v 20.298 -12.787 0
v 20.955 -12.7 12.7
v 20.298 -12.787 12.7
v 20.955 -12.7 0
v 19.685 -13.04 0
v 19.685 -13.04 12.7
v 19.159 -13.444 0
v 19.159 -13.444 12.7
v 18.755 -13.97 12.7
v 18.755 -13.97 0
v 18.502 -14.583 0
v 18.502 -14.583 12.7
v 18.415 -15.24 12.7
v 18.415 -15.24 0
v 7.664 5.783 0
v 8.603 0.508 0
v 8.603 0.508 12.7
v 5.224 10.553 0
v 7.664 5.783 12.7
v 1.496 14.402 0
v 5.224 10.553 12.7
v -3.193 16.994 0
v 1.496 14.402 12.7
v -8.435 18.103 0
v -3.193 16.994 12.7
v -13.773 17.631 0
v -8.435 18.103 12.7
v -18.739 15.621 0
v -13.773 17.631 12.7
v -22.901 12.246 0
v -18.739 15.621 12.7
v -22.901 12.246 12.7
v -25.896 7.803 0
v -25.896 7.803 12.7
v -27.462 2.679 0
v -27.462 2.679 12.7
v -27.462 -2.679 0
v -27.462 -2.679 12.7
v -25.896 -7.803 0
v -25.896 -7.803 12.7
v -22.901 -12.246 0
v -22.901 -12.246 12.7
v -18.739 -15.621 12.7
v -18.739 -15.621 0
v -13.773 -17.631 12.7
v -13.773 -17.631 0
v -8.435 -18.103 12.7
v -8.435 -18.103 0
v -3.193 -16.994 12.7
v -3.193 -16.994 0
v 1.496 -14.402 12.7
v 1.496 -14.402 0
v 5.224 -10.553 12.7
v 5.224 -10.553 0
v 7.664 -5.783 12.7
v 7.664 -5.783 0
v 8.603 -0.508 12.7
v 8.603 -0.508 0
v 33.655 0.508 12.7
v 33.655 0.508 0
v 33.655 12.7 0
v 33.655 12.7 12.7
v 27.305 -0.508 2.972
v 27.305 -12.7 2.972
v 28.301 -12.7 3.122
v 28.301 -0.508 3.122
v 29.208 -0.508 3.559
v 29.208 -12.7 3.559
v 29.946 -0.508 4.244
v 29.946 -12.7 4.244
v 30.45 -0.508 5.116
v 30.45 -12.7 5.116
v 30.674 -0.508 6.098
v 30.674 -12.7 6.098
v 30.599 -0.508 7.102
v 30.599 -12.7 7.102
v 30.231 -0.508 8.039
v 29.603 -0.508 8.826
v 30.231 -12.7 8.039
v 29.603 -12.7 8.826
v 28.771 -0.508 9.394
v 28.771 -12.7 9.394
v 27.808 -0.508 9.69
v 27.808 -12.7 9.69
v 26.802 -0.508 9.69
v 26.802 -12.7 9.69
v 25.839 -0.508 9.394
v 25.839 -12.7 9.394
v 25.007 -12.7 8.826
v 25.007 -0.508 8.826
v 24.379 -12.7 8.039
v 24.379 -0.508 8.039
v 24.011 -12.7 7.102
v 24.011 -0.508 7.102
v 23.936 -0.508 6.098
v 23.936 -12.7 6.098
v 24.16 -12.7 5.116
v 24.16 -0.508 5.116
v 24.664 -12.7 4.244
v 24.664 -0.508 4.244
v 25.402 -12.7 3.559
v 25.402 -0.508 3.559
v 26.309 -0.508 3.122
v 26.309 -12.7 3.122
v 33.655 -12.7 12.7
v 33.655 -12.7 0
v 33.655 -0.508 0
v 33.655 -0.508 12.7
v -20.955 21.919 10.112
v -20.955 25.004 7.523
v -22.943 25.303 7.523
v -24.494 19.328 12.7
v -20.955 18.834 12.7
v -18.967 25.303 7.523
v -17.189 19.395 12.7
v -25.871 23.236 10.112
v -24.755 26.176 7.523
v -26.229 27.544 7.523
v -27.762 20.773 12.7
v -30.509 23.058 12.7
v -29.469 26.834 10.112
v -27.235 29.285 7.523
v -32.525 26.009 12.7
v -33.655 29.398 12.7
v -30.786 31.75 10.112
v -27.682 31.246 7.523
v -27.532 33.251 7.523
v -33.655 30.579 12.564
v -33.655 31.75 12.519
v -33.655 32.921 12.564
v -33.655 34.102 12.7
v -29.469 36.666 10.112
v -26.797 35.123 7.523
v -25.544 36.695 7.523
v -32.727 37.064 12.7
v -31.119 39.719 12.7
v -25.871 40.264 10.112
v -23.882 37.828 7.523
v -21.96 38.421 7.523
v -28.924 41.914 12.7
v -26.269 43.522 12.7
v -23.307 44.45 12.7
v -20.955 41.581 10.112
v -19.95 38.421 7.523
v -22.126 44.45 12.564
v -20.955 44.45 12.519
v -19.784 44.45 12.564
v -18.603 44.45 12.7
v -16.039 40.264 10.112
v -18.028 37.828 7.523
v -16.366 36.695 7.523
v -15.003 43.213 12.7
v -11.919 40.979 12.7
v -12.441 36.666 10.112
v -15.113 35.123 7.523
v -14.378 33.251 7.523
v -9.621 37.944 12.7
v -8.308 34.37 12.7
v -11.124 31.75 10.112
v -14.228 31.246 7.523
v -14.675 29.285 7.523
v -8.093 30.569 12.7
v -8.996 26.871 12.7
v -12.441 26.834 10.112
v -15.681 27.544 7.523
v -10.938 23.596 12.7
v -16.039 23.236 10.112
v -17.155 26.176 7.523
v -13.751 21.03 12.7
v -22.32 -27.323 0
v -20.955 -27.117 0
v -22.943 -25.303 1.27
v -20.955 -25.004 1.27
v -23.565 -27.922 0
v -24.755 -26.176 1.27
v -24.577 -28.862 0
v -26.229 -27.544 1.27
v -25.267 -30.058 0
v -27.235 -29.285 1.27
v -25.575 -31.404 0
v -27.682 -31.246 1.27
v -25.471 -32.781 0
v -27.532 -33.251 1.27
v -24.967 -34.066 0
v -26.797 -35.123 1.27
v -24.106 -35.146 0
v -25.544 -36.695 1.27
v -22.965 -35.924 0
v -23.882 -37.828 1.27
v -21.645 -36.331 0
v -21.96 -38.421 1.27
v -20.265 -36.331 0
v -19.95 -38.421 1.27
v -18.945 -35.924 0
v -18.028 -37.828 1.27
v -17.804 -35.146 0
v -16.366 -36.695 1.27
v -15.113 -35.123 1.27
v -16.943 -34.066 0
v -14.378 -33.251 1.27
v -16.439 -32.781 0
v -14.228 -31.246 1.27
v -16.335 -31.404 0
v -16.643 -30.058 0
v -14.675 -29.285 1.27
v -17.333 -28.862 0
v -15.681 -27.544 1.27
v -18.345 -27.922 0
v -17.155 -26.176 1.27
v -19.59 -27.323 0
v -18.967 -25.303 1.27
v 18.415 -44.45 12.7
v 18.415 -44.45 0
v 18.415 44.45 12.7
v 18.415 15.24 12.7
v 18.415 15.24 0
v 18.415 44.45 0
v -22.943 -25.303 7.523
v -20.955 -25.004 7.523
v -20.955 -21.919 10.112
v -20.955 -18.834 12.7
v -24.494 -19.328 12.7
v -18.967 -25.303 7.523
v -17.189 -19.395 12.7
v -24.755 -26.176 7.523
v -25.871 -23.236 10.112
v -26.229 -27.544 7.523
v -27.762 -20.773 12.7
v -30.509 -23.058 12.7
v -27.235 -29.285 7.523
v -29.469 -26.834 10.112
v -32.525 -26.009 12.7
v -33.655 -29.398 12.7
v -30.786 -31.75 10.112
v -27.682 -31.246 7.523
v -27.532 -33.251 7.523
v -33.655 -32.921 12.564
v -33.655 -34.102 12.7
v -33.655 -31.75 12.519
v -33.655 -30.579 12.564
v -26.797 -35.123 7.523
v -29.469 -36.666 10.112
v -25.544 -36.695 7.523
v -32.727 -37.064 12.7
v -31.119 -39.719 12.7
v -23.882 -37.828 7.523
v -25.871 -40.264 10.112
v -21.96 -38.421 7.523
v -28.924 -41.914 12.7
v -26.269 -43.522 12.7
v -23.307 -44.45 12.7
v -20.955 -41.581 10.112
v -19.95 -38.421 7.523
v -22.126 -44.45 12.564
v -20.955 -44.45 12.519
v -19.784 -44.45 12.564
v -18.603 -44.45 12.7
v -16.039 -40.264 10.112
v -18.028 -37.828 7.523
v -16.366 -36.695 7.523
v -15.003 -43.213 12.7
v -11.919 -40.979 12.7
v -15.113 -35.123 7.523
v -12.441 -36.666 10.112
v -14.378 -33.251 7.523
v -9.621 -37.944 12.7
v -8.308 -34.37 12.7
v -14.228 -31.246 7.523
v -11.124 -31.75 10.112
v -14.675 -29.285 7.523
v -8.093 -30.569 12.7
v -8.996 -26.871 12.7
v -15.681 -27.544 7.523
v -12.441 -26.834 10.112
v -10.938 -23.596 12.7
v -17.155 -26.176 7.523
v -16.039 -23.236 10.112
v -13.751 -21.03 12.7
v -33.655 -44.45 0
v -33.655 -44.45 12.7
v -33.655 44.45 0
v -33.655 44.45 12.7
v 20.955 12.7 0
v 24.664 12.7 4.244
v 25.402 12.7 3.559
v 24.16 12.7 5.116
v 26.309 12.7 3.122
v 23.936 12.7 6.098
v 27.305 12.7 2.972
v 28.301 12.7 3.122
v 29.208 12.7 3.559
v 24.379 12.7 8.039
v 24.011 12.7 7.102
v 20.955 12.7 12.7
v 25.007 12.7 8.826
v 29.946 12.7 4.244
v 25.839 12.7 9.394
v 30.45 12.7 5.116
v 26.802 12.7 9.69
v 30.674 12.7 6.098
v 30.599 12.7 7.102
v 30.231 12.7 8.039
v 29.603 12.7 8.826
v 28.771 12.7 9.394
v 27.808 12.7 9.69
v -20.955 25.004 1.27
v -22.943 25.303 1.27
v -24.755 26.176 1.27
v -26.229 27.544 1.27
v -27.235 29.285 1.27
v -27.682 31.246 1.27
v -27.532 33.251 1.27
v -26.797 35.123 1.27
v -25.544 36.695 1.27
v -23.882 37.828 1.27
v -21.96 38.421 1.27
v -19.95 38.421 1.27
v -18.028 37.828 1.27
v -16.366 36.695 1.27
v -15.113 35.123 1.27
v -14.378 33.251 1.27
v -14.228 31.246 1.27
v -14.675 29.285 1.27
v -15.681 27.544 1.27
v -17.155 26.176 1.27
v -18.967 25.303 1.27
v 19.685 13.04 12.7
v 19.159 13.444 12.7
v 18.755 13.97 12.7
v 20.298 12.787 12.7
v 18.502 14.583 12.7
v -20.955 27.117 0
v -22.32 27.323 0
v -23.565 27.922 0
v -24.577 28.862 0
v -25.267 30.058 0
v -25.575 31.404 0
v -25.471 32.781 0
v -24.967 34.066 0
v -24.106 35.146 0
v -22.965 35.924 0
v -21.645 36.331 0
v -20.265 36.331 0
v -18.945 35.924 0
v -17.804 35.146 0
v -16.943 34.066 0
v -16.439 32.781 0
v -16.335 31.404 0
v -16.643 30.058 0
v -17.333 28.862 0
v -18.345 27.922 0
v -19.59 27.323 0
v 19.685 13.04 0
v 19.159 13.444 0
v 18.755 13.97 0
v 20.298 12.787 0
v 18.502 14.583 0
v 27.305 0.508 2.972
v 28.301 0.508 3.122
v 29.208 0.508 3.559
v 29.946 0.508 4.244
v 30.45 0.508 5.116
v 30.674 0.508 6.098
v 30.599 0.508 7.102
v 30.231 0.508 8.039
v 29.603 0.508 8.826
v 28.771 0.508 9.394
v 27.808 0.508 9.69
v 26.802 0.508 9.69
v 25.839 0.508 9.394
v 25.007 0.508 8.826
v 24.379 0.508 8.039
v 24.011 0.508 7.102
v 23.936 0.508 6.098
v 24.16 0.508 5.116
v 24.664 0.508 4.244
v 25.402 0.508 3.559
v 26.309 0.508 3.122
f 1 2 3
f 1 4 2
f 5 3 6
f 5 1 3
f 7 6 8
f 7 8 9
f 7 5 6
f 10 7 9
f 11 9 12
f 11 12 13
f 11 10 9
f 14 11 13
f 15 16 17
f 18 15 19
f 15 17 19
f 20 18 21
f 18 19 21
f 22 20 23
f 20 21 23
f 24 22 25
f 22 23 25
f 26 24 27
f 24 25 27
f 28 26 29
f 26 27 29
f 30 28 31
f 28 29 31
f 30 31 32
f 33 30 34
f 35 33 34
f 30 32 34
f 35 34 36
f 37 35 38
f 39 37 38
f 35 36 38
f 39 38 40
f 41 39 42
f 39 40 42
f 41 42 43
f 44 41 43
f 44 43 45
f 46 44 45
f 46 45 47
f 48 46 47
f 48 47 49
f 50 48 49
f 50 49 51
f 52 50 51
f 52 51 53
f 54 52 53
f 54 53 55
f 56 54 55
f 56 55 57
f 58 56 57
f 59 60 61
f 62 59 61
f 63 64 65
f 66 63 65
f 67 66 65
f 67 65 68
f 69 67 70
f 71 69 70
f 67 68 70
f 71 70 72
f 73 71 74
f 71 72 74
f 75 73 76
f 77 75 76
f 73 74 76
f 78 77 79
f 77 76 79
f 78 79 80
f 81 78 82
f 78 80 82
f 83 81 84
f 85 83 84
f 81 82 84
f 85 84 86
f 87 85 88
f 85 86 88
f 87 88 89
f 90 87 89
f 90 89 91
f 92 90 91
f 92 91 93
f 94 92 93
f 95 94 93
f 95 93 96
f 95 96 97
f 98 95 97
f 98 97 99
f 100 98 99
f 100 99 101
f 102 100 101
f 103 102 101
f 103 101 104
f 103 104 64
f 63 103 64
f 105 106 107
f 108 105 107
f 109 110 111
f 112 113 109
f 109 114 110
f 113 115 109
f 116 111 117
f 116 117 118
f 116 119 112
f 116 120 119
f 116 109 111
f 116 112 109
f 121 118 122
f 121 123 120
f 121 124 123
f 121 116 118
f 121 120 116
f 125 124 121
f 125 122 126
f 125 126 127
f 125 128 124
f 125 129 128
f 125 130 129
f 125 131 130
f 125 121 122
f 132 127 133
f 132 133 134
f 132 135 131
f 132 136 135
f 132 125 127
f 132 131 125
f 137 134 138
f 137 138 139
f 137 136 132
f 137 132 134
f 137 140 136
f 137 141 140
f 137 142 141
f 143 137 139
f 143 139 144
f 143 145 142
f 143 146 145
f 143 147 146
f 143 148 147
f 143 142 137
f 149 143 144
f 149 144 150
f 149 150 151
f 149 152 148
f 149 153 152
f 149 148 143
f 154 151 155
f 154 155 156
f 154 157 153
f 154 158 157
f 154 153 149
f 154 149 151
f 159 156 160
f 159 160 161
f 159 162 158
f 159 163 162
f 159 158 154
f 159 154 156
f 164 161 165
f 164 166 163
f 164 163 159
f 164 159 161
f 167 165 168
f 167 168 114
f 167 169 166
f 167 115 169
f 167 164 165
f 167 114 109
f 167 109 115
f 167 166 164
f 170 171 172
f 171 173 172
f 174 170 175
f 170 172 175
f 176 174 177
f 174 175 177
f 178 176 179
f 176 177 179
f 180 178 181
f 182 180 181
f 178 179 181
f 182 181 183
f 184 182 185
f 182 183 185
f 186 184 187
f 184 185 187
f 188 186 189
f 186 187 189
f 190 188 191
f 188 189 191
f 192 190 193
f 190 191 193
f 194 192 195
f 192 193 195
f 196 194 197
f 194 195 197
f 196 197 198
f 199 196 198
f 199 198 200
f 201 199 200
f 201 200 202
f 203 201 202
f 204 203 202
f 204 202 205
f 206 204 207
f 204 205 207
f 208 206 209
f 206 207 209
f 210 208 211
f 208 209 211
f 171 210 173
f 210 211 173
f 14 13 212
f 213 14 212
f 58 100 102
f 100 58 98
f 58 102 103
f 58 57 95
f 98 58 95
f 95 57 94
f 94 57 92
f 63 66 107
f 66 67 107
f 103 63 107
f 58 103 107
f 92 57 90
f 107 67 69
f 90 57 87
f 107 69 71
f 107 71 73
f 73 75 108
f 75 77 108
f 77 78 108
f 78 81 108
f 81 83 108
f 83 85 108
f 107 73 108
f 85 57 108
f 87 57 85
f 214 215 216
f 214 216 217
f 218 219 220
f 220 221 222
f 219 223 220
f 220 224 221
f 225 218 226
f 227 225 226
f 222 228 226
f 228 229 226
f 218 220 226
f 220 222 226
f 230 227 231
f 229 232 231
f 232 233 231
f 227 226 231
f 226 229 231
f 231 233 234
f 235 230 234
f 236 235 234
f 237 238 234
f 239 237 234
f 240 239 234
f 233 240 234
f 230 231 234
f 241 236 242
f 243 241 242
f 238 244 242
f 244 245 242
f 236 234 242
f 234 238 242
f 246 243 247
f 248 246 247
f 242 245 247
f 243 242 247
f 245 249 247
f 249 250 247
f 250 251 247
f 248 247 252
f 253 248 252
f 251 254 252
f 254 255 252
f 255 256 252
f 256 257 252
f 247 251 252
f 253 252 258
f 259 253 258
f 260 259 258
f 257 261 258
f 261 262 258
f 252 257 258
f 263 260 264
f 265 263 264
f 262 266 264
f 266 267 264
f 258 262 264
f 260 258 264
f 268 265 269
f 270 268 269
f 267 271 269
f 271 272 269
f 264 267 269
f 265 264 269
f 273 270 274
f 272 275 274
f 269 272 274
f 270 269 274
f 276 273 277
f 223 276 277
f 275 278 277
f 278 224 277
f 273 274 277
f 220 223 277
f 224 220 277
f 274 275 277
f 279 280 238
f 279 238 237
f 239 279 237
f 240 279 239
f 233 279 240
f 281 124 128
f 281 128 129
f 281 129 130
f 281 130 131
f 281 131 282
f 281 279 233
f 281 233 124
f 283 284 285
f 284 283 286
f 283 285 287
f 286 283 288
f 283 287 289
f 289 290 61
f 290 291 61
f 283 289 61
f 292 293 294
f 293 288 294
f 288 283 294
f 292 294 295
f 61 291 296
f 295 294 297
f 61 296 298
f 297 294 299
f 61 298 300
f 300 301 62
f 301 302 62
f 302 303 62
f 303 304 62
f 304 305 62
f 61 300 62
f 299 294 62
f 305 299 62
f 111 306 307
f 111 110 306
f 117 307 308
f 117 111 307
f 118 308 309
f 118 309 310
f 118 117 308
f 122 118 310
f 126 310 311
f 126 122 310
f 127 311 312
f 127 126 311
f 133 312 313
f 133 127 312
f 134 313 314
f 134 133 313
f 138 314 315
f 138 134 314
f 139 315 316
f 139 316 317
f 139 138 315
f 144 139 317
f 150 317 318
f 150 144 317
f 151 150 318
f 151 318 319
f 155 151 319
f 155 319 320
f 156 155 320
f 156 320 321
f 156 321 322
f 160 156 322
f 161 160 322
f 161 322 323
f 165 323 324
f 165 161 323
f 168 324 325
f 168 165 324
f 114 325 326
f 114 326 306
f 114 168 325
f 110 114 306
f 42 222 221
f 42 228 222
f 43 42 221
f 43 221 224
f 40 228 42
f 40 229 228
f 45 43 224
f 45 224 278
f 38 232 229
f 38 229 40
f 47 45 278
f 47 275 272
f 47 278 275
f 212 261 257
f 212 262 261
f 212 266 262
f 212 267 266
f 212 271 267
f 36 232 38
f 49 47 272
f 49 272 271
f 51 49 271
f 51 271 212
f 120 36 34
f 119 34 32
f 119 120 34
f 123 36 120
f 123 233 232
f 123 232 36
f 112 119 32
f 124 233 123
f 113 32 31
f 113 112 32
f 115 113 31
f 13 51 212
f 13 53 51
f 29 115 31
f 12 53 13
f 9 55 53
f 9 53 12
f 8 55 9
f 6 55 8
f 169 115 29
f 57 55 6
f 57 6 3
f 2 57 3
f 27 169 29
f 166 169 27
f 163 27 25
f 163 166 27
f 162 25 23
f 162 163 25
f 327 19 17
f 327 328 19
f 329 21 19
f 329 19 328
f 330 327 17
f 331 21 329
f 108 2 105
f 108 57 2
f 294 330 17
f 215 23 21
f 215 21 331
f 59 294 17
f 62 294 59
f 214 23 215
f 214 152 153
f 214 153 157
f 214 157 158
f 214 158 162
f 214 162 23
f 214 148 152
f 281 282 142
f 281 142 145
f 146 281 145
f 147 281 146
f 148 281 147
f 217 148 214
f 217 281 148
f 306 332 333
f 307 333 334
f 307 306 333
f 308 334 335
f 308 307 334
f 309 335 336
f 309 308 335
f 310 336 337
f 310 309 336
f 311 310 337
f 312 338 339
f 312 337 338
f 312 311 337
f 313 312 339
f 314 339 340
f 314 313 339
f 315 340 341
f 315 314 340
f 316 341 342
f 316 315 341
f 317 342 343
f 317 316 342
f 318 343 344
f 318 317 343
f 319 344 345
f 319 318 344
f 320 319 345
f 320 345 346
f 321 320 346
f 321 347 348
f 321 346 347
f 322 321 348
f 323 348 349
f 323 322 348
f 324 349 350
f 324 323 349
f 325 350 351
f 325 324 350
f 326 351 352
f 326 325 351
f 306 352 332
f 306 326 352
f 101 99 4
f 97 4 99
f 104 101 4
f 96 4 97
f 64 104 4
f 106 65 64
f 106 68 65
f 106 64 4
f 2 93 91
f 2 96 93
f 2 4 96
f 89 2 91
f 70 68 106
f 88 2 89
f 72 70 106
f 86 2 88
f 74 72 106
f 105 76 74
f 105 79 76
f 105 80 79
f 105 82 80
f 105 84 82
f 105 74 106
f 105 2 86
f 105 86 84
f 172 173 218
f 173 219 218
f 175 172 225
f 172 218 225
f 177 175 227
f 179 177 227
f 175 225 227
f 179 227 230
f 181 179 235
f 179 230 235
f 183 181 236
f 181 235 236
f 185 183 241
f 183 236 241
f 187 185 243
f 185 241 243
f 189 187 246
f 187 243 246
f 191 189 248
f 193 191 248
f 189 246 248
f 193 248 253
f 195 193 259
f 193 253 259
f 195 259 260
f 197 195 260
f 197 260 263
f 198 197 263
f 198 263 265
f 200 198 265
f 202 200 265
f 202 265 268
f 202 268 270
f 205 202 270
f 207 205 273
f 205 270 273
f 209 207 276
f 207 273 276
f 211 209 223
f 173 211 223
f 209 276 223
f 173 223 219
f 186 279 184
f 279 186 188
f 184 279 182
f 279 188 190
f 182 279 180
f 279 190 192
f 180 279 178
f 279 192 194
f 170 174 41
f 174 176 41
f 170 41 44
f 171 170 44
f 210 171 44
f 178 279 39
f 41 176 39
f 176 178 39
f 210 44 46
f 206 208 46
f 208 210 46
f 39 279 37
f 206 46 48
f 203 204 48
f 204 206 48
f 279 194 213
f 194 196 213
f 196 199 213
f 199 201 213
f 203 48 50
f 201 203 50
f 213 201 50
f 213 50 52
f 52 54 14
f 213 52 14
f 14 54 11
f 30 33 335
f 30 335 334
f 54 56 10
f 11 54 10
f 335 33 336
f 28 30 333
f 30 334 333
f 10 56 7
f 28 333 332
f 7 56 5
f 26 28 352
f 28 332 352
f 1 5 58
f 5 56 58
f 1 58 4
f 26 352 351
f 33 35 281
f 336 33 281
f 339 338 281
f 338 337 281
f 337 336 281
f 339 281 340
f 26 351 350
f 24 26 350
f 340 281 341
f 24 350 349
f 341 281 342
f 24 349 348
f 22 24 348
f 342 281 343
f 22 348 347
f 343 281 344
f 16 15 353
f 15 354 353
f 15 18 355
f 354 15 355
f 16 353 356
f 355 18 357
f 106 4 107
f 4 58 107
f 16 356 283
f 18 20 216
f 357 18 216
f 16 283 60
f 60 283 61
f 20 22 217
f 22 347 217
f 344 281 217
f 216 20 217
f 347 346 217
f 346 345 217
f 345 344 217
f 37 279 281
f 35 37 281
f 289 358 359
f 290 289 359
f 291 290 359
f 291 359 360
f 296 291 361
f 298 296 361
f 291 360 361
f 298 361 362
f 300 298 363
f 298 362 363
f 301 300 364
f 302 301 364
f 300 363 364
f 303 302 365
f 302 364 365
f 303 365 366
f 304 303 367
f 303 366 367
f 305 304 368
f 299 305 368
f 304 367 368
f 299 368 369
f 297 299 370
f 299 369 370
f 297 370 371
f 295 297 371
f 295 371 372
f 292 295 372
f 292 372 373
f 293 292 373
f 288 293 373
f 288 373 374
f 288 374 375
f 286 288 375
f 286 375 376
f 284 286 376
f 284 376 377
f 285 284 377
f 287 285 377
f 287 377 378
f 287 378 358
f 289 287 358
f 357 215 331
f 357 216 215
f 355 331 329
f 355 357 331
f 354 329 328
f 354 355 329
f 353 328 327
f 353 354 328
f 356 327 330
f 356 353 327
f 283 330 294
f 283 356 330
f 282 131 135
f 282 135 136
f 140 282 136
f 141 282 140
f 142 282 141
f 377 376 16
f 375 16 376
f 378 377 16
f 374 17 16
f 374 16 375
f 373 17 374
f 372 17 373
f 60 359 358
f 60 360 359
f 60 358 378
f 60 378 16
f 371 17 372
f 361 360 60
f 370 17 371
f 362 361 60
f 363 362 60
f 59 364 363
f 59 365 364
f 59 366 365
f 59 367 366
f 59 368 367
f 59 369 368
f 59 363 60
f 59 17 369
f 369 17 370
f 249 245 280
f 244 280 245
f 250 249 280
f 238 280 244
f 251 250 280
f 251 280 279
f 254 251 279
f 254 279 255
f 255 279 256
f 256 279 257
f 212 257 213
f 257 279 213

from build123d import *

# Parameters (mm, degrees)
SKETCH1_W               = 67.31
SKETCH1_H               = 88.9
EXTRUDE1_DEPTH          = 12.7
SKETCH2_R               = 18.1356
EXTRUDE2_DEPTH          = 58.181741185
SKETCH3_W               = 28.468633454
SKETCH3_H               = 1.016
EXTRUDE3_DEPTH          = 58.181741185
F_1_4_CLEARANCE_HOLE1_D = 6.7564
SKETCH10_W              = 15.24
SKETCH10_H              = 31.75
EXTRUDE4_DEPTH          = 58.181741185
FILLET1_R               = 2.54
FILLET1_OF_MIRROR2_R    = 2.54


with BuildPart() as part:
    # Sketch1 → Extrude1 (new body)
    with BuildSketch(Plane.XY):
        Rectangle(SKETCH1_W, SKETCH1_H)
    extrude(amount=EXTRUDE1_DEPTH)

    # Sketch2 → Extrude2 (cut, through all)
    with BuildSketch(Plane.XY.offset(12.7)):
        with Locations((-9.525, 0)):
            Circle(SKETCH2_R)
    extrude(amount=-EXTRUDE2_DEPTH, mode=Mode.SUBTRACT)

    # Sketch3 → Extrude3 (cut, through all)
    with BuildSketch(Plane.XY.offset(12.7)):
        with Locations((21.1328, 0)):
            Rectangle(SKETCH3_W, SKETCH3_H)
    extrude(amount=-EXTRUDE3_DEPTH, mode=Mode.SUBTRACT)

    # 1/4 Clearance Hole1 (through all)
    with Locations(Plane(origin=(27.305, 44.45, 6.35), x_dir=(0, 0, 1), z_dir=(0, 1, 0))):
        with Locations((0, 0)):
            Hole(F_1_4_CLEARANCE_HOLE1_D / 2)

    # Sketch9 → CSK for 1/2 Flat Head Machine Screw (100)1 (revolve, cut)
    with BuildSketch(Plane(origin=(-20.955, 31.75, 12.7), x_dir=(0, -1, 0), z_dir=(1, 0, 0))):
        Polygon((0, 0), (0, 15.483549943), (6.74624, 11.43), (6.74624, 5.17695943), (12.9159, 0), align=None)
    csk_for_1_2_flat_head_machine_screw_100 = revolve(axis=Axis((-20.955, 31.75, 19.05), (0, 0, -1)), mode=Mode.SUBTRACT)

    # Mirror1: CSK for 1/2 Flat Head Machine Screw (100)1 across plane
    add(csk_for_1_2_flat_head_machine_screw_100.mirror(Plane.ZX), mode=Mode.SUBTRACT)

    # Sketch10 → Extrude4 (cut, through all)
    with BuildSketch(Plane.XY.offset(12.7)):
        with Locations((26.035, 28.575)):
            Rectangle(SKETCH10_W, SKETCH10_H)
    extrude4 = extrude(amount=-EXTRUDE4_DEPTH, mode=Mode.SUBTRACT)

    # Fillet1
    fillet1_edges = [part.edges().sort_by_distance(p)[0] for p in [
        (18.415, 12.7, 6.35),
    ]]
    fillet(fillet1_edges, radius=FILLET1_R)

    # Mirror2: Extrude4 across plane
    add(extrude4.mirror(Plane.ZX), mode=Mode.SUBTRACT)

    # Fillet1 of Mirror2
    fillet1_of_mirror2_edges = [part.edges().sort_by_distance(p)[0] for p in [
        (18.415, -12.7, 6.35),
    ]]
    fillet(fillet1_of_mirror2_edges, radius=FILLET1_OF_MIRROR2_R)


solid = part.part
